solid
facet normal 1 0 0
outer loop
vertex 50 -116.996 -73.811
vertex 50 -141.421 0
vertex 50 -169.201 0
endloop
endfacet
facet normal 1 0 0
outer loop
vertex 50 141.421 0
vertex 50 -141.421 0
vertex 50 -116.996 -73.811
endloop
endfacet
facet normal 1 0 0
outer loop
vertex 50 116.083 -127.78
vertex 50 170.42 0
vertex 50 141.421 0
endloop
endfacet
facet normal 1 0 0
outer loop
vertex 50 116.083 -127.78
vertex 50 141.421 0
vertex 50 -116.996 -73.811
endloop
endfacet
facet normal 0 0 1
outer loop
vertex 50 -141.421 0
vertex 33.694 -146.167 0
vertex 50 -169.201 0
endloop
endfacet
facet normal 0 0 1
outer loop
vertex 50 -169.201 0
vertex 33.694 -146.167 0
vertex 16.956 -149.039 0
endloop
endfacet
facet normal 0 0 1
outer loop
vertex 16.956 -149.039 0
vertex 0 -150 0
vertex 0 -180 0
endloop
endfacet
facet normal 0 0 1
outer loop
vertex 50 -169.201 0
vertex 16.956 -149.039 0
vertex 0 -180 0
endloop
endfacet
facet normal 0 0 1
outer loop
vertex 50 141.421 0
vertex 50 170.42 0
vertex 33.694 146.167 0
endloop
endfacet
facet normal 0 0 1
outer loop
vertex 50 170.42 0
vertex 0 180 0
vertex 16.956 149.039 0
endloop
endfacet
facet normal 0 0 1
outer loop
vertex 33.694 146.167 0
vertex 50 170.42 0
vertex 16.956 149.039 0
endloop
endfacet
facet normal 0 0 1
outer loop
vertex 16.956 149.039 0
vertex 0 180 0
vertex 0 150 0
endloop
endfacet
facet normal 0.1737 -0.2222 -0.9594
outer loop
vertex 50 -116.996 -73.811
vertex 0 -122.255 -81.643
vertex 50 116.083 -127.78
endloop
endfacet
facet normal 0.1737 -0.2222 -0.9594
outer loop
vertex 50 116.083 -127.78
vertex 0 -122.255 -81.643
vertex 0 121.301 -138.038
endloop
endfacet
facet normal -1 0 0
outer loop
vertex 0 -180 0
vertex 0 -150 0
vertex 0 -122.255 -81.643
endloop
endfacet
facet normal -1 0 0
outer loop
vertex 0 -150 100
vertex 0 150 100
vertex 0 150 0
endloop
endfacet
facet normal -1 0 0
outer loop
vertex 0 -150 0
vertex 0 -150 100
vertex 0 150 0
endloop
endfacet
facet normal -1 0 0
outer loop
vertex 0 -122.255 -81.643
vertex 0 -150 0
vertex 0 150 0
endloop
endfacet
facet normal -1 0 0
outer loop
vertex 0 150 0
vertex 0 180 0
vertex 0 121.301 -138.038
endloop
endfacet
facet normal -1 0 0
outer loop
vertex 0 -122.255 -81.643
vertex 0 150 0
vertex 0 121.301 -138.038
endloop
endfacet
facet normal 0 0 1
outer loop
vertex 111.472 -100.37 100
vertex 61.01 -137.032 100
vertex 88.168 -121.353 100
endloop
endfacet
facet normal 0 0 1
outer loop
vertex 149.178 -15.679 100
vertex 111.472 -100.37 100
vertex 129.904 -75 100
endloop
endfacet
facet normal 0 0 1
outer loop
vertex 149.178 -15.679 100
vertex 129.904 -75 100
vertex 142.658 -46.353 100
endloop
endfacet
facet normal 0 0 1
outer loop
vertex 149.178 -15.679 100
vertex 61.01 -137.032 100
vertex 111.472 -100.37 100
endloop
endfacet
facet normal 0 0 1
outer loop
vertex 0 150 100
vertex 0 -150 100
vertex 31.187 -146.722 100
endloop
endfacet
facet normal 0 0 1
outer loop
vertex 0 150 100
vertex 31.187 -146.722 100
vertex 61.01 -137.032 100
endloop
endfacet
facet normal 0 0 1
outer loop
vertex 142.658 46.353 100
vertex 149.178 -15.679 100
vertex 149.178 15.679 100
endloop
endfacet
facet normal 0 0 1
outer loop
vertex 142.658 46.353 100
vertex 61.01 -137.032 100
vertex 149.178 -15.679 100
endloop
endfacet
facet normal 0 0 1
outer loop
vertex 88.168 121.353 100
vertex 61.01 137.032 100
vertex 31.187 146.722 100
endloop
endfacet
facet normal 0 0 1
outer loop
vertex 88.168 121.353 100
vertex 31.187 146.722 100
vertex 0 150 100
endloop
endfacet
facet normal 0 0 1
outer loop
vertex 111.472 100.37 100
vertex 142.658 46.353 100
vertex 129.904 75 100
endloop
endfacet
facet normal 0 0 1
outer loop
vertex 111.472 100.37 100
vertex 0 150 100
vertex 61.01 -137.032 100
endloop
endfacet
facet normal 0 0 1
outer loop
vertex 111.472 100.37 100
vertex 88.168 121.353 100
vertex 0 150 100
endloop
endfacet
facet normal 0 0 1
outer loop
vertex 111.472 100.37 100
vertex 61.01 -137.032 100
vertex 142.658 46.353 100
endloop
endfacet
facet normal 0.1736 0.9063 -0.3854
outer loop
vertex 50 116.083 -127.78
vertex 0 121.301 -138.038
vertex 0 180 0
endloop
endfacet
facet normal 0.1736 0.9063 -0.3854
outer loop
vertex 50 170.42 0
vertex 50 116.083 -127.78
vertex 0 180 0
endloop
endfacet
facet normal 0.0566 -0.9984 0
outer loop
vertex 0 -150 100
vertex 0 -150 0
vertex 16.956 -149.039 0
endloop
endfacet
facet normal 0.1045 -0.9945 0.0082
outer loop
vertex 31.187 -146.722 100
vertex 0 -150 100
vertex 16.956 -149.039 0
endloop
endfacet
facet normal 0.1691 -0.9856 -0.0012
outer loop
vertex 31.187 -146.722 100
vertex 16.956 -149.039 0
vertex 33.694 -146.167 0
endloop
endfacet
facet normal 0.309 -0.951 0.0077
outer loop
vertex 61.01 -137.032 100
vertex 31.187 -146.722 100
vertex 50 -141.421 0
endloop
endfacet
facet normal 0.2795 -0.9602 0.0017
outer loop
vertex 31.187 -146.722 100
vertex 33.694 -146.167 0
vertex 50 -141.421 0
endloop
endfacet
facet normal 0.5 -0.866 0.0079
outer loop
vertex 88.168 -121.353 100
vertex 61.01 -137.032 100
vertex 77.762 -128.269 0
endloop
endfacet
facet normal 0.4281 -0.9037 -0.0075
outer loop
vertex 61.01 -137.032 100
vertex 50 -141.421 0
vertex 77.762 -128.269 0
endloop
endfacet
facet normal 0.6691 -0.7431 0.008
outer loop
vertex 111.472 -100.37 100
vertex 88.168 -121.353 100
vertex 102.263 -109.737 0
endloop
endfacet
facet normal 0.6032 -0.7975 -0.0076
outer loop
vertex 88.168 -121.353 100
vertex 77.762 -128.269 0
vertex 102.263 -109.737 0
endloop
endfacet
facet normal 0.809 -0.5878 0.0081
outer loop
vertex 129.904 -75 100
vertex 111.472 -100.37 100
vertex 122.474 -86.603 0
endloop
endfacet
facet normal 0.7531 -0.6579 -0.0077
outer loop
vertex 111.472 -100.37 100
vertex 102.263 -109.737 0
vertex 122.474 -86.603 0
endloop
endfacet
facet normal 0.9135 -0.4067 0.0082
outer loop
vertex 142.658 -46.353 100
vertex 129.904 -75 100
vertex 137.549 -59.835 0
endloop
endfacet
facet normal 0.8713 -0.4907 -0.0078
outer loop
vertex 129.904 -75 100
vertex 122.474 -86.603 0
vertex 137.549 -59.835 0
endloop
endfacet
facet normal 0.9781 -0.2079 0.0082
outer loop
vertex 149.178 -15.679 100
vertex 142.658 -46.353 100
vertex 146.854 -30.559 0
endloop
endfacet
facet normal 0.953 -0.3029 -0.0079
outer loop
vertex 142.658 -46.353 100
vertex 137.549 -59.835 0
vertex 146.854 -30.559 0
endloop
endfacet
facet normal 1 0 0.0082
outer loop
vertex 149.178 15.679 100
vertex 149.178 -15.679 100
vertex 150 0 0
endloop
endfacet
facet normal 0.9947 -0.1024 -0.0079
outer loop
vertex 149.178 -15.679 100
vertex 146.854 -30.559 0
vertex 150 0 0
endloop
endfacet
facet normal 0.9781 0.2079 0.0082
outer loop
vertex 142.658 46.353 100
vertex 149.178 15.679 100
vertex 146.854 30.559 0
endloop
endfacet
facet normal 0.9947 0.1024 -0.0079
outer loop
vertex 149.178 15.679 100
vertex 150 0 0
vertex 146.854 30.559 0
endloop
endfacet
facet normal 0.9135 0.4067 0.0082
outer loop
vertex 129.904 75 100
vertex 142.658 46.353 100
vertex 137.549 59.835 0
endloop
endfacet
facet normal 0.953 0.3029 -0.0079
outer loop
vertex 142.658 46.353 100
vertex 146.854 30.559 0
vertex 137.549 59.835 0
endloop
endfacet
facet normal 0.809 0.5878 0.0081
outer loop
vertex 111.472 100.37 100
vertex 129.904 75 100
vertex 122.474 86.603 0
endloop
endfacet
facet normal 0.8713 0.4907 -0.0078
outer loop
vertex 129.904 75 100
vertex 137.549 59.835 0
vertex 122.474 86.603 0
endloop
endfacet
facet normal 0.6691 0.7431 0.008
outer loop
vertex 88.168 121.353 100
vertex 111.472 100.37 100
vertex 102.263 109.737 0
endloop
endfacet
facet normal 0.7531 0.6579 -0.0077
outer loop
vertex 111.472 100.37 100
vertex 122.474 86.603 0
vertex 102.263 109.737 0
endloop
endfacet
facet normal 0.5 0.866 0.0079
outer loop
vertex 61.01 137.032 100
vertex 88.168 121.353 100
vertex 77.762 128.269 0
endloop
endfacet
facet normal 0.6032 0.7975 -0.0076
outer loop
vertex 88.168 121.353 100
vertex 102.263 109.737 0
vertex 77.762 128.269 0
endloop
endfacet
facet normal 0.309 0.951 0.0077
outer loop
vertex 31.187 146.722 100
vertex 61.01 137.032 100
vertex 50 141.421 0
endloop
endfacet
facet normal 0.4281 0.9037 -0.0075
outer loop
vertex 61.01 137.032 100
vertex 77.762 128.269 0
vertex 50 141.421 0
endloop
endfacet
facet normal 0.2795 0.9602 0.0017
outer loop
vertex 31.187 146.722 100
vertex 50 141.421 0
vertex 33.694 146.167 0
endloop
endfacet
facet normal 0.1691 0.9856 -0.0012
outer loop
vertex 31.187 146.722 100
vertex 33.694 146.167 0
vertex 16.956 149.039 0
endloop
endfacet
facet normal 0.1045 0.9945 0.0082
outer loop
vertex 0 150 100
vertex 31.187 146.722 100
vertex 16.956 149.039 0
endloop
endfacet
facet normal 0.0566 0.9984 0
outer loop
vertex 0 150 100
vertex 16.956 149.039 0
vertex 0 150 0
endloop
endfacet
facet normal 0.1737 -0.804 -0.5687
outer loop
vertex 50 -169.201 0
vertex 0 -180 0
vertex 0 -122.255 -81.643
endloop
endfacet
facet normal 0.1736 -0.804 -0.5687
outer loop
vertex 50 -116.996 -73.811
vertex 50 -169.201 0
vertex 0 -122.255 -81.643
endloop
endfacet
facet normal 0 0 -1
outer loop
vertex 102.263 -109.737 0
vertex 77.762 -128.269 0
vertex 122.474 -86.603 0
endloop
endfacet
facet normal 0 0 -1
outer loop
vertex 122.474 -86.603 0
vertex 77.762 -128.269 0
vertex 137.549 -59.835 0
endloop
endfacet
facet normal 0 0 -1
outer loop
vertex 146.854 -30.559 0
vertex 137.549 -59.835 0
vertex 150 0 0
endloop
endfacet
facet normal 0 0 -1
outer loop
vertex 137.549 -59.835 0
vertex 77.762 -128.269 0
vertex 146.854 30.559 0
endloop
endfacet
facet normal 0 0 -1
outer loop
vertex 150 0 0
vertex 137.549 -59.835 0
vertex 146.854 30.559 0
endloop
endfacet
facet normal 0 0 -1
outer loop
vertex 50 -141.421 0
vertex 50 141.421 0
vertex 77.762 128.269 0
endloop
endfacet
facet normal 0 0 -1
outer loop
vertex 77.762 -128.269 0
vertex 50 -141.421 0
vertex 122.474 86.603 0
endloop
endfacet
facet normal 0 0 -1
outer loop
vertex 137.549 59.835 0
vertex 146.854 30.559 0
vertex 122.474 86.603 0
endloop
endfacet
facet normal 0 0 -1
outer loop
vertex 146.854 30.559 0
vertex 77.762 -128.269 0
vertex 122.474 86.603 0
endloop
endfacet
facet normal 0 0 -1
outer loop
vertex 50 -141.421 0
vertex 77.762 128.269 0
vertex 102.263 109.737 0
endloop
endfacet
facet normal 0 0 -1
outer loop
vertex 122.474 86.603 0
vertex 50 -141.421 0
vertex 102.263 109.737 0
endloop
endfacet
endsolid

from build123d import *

# Parameters (mm, degrees)
BOSS_EXTRUDE1_DEPTH = 100
BOSS_EXTRUDE2_DEPTH = 50
DRAFT1_ANGLE        = 10


with BuildPart() as part:
    # Sketch1 → Boss-Extrude1 (new body)
    with BuildSketch(Plane.XY):
        with BuildLine():
            Line((0, 150), (0, -150))
            ThreePointArc((0, -150), (150, 0), (0, 150))
        make_face()
    extrude(amount=BOSS_EXTRUDE1_DEPTH)

    # Sketch2 → Boss-Extrude2 (add)
    with BuildSketch(Plane.ZY):
        Polygon((0, 180), (0, -180), (-81.642618236, -122.255018507), (-138.037816677, 121.301097394), align=None)
    extrude(amount=-BOSS_EXTRUDE2_DEPTH)

    # Draft1
    draft1_faces = [part.faces().sort_by_distance(p)[0] for p in [
        (25, -151.127509253, -40.821309118),
        (25, 150.650548697, -69.018908338),
        (25, -0.476960556, -109.840217456),
    ]]
    draft(draft1_faces, Plane(origin=(0, 0, 0), x_dir=(0, 0, 1), z_dir=(1, 0, 0)), DRAFT1_ANGLE)


solid = part.part
